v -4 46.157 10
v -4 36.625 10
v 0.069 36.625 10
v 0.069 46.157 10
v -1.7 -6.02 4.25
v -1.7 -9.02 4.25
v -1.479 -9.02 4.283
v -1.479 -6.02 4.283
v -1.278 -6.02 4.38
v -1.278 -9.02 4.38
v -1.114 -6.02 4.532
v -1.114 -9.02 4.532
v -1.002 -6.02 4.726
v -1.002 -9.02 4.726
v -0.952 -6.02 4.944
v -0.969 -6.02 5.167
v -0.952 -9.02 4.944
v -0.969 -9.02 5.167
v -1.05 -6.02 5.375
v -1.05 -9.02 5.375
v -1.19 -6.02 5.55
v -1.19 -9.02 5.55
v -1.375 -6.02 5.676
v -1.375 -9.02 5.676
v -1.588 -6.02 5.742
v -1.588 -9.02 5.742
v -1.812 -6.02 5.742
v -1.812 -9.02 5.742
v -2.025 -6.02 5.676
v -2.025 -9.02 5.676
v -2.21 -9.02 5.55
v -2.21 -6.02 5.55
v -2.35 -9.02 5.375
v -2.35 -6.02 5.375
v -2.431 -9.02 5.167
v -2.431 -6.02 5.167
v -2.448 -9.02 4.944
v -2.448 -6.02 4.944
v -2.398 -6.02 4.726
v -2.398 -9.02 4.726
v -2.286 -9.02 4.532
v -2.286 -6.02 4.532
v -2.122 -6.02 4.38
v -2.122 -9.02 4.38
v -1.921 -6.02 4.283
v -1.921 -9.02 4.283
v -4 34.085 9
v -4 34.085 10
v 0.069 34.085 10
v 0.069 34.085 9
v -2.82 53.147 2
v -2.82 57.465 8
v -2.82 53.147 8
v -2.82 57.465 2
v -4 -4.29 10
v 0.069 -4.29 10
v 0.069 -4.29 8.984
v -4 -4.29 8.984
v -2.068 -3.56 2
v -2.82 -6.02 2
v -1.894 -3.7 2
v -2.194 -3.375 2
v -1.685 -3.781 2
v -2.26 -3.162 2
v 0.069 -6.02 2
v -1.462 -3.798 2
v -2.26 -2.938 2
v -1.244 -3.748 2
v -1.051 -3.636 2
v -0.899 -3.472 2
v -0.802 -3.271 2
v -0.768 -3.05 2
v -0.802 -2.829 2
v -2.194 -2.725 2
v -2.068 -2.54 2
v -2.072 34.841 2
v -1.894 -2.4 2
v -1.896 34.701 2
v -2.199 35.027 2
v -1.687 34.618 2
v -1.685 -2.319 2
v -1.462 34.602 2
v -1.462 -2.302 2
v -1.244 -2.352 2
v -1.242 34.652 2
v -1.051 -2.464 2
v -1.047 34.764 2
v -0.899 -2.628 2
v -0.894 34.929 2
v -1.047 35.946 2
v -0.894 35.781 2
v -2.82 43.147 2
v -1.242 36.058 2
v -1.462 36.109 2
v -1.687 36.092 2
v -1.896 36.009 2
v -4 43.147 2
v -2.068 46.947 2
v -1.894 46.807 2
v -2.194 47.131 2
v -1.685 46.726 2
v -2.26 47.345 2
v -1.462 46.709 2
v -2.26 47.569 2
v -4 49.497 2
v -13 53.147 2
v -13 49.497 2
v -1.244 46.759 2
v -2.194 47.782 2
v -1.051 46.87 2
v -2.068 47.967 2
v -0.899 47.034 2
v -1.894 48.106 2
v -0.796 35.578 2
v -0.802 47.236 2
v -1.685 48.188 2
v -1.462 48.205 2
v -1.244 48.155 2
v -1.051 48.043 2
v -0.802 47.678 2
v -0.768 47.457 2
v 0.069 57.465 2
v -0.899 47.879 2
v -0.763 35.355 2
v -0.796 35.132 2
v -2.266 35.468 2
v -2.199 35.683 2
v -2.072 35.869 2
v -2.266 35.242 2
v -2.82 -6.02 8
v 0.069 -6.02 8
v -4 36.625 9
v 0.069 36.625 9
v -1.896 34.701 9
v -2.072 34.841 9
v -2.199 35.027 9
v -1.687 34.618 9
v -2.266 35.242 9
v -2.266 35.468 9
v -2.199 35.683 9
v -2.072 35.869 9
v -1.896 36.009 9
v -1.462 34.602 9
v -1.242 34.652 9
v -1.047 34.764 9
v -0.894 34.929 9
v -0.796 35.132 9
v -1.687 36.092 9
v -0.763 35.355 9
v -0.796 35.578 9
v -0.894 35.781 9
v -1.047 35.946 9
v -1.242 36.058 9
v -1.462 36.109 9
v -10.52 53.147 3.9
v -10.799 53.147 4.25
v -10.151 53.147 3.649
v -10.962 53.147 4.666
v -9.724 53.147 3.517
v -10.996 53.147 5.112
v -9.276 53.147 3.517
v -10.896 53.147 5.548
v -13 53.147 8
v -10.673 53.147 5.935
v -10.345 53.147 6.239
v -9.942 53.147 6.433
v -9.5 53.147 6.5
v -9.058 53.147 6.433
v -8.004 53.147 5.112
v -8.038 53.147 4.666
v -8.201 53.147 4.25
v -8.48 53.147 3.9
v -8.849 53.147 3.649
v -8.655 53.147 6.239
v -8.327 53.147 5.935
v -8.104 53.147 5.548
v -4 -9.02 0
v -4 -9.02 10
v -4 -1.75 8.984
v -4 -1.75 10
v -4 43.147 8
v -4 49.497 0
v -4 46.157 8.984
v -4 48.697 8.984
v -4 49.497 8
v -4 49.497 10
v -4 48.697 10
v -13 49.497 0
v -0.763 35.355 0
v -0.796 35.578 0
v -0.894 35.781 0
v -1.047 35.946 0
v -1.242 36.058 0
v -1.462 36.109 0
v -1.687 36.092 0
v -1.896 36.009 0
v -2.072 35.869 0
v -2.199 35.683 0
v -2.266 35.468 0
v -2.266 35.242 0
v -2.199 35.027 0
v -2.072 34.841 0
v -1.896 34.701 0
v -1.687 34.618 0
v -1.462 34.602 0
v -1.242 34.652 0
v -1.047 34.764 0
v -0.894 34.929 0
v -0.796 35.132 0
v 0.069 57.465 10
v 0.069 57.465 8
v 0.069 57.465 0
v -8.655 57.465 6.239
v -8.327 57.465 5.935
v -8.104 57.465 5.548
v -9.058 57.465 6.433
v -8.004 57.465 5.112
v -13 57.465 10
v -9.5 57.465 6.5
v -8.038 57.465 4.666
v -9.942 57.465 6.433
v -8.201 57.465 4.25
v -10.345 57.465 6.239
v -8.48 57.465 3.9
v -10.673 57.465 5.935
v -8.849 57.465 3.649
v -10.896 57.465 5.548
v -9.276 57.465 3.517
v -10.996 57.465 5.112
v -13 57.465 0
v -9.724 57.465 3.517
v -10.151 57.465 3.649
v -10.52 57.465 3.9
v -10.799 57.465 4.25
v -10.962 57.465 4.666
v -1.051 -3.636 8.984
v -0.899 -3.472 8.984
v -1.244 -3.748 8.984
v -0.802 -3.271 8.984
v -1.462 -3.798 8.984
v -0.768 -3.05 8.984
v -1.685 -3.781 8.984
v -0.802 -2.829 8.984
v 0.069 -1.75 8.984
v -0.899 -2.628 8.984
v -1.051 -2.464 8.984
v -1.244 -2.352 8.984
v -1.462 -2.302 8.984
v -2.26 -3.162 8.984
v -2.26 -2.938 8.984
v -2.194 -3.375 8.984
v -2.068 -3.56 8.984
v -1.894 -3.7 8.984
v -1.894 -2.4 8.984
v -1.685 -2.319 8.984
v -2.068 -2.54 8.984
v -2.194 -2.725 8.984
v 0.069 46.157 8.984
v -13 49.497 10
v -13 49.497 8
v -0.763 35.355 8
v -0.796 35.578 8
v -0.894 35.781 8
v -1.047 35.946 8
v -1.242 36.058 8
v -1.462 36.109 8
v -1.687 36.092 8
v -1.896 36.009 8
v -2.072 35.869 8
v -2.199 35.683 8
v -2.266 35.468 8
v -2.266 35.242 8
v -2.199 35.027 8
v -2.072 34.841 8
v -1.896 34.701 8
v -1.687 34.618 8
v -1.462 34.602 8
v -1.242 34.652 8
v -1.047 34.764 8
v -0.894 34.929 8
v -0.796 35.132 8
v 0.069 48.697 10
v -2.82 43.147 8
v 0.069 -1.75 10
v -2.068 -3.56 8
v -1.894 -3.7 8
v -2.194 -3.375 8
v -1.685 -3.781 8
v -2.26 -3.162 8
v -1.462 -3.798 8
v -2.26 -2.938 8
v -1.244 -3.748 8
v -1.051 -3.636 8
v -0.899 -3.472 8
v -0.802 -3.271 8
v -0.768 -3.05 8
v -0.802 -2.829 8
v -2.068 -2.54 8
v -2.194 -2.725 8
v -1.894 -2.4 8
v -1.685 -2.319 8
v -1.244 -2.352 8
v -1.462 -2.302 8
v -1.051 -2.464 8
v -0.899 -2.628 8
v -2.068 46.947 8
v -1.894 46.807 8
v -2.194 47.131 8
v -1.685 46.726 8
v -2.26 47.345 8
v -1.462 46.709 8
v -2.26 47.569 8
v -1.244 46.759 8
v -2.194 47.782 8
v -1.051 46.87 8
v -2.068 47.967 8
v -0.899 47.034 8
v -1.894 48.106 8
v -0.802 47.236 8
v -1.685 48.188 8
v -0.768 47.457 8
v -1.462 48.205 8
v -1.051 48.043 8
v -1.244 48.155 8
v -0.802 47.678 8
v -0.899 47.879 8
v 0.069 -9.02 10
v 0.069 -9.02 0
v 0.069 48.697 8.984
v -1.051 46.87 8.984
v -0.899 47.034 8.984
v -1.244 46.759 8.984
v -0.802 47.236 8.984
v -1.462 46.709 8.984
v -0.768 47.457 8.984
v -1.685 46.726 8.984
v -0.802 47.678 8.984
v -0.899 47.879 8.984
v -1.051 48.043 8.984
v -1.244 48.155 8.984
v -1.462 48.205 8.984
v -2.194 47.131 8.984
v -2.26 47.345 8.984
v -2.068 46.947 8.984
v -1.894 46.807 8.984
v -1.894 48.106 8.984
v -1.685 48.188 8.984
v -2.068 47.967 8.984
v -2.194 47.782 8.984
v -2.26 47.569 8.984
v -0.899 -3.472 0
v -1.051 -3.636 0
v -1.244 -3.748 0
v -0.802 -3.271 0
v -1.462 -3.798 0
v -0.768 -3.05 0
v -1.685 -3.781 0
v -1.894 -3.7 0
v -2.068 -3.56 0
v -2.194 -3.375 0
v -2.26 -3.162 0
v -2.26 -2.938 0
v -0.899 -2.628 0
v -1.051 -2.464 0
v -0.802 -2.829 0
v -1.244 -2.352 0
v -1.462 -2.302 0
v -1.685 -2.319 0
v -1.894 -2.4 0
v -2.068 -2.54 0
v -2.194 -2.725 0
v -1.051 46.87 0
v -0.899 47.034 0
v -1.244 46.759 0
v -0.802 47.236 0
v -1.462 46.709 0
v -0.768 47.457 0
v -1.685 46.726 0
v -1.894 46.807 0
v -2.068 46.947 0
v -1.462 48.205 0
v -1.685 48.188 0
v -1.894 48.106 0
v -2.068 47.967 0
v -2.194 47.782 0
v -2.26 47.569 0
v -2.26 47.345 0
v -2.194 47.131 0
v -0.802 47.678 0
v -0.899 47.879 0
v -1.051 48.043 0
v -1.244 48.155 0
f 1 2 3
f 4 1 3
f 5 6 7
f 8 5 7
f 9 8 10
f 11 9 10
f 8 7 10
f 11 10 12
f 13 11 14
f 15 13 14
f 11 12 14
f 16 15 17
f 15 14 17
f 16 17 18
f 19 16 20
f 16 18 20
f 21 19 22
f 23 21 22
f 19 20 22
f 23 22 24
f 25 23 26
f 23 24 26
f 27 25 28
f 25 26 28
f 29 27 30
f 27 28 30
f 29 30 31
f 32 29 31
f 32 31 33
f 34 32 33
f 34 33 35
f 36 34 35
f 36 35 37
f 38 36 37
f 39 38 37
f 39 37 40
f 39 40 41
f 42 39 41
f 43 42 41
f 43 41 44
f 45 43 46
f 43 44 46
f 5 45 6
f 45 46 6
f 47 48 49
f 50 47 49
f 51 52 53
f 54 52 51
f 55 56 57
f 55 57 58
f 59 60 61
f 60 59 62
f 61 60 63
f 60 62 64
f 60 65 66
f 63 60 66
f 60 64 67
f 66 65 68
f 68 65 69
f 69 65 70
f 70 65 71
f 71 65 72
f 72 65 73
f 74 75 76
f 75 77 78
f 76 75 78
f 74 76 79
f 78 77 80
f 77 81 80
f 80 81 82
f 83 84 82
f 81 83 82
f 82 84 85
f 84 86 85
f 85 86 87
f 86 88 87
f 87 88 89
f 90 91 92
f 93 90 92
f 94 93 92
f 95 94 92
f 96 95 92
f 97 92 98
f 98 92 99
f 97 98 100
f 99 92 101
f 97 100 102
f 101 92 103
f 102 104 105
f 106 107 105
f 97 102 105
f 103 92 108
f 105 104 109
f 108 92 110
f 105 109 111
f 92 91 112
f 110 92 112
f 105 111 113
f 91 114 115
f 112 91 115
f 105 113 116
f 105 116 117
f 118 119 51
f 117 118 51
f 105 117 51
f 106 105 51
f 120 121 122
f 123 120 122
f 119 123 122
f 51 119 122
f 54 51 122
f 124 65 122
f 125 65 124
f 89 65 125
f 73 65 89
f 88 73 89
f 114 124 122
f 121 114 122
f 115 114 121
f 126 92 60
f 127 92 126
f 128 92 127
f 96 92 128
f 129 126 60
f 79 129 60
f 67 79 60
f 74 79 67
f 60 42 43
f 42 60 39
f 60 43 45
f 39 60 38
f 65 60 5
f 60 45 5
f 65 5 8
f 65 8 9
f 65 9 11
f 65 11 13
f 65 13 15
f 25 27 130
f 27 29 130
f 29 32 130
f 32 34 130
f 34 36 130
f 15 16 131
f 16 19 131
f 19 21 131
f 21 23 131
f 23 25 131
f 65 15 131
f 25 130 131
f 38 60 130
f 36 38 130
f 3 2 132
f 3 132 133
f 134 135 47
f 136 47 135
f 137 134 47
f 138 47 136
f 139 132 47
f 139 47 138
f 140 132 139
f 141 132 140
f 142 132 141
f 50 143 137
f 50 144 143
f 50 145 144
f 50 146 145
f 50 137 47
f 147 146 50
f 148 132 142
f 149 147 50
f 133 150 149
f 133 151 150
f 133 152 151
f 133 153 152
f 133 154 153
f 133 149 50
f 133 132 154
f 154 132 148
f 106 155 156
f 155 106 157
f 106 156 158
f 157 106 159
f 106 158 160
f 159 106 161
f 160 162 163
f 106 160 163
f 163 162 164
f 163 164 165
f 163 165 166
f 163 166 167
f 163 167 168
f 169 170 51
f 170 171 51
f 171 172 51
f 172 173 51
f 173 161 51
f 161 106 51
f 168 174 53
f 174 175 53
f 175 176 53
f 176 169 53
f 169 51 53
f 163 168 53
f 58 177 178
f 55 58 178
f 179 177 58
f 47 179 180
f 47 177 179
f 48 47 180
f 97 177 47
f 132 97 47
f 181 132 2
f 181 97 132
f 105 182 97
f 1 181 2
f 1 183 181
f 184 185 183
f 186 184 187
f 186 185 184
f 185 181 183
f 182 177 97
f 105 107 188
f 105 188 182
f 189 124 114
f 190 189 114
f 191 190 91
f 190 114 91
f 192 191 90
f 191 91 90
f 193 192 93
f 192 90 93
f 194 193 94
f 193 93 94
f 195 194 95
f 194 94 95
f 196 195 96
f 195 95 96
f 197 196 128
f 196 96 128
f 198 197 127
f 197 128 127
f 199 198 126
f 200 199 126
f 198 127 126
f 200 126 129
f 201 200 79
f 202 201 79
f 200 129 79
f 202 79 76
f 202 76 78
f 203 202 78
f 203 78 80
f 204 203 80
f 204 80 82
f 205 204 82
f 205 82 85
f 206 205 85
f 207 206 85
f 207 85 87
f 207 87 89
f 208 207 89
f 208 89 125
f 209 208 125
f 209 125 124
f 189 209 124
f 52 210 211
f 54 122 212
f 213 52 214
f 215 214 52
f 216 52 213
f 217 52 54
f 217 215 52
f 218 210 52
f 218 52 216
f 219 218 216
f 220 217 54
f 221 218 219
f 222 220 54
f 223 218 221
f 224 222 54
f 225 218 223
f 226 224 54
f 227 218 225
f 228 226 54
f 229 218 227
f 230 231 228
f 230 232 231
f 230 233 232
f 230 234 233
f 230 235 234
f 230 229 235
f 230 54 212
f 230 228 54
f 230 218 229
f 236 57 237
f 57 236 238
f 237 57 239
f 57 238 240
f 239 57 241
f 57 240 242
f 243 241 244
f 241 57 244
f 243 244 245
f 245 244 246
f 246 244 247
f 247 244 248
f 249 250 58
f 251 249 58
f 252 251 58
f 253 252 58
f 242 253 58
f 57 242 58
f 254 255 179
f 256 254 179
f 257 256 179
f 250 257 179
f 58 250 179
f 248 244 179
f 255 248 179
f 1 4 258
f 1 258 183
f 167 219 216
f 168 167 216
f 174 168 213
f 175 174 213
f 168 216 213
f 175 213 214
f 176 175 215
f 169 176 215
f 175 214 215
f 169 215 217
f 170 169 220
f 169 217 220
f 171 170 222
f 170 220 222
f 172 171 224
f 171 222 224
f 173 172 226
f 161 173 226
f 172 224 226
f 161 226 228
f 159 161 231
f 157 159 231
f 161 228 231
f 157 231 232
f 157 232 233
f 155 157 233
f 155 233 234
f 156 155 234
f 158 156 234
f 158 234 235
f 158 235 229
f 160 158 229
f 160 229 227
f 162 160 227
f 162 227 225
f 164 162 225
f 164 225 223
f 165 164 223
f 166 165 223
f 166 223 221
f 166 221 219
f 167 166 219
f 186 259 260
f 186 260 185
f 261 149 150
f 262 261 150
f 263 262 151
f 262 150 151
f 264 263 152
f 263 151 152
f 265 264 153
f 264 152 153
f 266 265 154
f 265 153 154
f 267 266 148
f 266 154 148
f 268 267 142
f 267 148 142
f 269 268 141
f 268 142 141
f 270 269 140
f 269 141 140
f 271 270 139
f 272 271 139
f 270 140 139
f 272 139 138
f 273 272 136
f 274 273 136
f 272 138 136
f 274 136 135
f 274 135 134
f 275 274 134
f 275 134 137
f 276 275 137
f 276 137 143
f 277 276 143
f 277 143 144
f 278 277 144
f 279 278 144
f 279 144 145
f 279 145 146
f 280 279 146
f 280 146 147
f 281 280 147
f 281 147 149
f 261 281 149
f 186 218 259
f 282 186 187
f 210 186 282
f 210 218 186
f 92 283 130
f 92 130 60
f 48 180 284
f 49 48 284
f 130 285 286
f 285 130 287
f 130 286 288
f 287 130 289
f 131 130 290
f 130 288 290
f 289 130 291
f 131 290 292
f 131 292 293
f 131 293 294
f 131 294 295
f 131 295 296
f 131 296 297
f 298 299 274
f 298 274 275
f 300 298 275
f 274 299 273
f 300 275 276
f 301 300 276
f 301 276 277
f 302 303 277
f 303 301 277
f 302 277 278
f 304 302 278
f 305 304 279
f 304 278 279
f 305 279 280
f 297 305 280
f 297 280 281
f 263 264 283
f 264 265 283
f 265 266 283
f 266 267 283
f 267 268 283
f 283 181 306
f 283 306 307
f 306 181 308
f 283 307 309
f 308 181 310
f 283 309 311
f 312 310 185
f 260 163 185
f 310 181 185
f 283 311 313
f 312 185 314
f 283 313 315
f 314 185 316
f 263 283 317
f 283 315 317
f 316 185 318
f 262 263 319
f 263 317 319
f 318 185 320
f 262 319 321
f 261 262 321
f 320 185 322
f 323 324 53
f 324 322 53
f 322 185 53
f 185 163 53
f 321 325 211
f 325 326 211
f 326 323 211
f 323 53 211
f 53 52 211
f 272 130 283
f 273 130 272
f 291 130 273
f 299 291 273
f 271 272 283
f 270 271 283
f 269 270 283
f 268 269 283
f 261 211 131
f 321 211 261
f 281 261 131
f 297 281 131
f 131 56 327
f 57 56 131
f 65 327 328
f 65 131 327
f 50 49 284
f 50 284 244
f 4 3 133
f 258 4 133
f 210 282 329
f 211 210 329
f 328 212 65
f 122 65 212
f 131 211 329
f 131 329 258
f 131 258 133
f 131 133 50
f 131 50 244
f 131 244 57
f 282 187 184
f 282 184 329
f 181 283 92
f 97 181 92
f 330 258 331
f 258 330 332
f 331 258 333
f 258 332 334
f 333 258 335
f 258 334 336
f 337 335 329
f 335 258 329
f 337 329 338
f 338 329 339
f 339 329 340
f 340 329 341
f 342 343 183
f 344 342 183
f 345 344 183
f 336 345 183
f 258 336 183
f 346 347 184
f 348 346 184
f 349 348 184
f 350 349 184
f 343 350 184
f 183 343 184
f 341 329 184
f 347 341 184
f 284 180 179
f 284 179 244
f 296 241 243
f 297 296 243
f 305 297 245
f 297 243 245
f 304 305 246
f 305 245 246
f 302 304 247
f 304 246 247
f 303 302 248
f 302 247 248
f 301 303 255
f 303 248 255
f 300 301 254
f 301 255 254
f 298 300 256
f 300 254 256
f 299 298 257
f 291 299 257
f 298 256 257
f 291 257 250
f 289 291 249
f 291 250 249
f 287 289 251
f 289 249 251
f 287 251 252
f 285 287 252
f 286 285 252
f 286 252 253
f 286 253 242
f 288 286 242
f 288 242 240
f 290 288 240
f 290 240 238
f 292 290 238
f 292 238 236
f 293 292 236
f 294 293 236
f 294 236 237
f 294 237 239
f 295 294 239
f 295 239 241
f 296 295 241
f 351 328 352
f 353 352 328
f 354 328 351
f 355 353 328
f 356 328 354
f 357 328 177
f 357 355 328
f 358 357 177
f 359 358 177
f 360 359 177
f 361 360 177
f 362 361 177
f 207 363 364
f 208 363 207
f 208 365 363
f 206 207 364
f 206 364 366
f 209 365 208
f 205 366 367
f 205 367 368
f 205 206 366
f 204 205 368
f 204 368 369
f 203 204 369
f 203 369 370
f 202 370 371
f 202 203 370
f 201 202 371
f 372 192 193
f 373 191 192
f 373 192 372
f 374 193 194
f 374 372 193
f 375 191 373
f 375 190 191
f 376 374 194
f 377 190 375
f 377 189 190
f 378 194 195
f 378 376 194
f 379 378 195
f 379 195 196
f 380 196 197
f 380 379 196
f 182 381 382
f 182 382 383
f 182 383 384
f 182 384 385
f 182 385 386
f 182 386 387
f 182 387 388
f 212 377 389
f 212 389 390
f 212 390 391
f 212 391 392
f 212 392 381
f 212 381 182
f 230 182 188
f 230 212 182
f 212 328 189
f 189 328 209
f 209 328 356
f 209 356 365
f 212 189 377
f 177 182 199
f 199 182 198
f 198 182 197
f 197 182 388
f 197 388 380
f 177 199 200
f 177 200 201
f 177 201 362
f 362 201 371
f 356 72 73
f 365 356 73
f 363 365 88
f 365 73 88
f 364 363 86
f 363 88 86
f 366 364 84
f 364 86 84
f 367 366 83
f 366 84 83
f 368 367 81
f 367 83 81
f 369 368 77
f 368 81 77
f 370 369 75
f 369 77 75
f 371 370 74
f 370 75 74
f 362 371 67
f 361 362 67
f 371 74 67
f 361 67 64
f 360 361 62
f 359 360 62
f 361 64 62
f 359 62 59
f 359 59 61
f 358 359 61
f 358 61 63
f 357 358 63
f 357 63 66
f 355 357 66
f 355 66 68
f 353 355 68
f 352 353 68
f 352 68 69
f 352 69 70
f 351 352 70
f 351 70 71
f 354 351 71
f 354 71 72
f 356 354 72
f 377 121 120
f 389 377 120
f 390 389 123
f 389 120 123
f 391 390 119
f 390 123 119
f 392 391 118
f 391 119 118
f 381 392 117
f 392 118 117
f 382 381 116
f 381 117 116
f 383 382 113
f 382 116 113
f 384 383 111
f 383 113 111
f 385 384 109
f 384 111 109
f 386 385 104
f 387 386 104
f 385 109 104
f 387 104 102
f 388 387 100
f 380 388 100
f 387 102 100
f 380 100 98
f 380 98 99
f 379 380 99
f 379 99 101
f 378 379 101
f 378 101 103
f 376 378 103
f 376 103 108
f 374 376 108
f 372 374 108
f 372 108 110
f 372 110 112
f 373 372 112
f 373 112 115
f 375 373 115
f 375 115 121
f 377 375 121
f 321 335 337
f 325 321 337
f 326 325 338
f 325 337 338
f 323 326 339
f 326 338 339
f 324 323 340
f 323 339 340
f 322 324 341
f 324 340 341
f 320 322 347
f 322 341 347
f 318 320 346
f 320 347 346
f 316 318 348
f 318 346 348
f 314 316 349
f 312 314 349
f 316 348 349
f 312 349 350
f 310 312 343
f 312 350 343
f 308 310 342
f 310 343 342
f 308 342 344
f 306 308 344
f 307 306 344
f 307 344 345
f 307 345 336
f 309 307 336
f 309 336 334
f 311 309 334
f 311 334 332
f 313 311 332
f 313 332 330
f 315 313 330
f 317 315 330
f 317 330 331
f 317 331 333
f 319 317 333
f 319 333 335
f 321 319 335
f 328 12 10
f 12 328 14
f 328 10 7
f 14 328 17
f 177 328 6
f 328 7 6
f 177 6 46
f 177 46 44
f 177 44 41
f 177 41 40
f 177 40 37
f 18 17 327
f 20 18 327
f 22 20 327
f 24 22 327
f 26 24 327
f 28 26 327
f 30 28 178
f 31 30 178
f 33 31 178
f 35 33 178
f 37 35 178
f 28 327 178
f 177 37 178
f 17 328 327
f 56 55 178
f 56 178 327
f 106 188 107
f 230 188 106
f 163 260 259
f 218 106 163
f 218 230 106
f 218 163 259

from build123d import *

# Parameters (mm, degrees)
BOSS_EXTRUDE2_DEPTH = 10
SKETCH2_W           = 6
SKETCH2_H           = 21.5
CUT_EXTRUDE1_DEPTH  = 2
SKETCH18_W          = 10
SKETCH18_H          = 4
CUT_EXTRUDE6_DEPTH  = 2.32
BOSS_EXTRUDE4_DEPTH = 35.965
SKETCH20_W          = 10
SKETCH20_H          = 4.318
BOSS_EXTRUDE5_DEPTH = 9
SKETCH21_W          = 2
SKETCH21_H          = 57.465
BOSS_EXTRUDE6_DEPTH = 0.889
BOSS_EXTRUDE7_DEPTH = 9.02
CUT_EXTRUDE7_DEPTH  = 1.016
SKETCH24_W          = 4.069
SKETCH24_H          = 2.54
CUT_EXTRUDE8_DEPTH  = 1
SKETCH30_R          = 0.75565
CUT_EXTRUDE14_DEPTH = 95.738007626
SKETCH34_R          = 1.5
CUT_EXTRUDE18_DEPTH = 10
SKETCH35_R          = 0.75
CUT_EXTRUDE19_DEPTH = 60.59814159
SKETCH36_W          = 6
SKETCH36_H          = 10
CUT_EXTRUDE20_DEPTH = 10
SKETCH37_W          = 9
SKETCH37_H          = 2
BOSS_EXTRUDE8_DEPTH = 3.65
SKETCH38_W          = 4.069
SKETCH38_H          = 10
BOSS_EXTRUDE9_DEPTH = 3
SKETCH39_R          = 0.75
CUT_EXTRUDE21_DEPTH = 3


with BuildPart() as part:
    # Sketch1 → Boss-Extrude2 (new body)
    with BuildSketch(Plane.XY):
        Polygon((-4, 0), (-0.82, 0), (-0.82, 21.5), (-6.32, 21.5), (-6.32, 17.5), (-4, 17.5), align=None)
    extrude(amount=BOSS_EXTRUDE2_DEPTH)

    # Sketch2 → Cut-Extrude1 (cut)
    with BuildSketch(Plane(origin=(-0.82, 0, 0), x_dir=(0, 0, -1), z_dir=(1, 0, 0))):
        with Locations((-5, 10.75)):
            Rectangle(SKETCH2_W, SKETCH2_H)
    extrude(amount=-CUT_EXTRUDE1_DEPTH, mode=Mode.SUBTRACT)

    # Sketch18 → Cut-Extrude6 (cut)
    with BuildSketch(Plane.ZY.offset(6.32)):
        with Locations((5, 19.5)):
            Rectangle(SKETCH18_W, SKETCH18_H)
    extrude(amount=-CUT_EXTRUDE6_DEPTH, mode=Mode.SUBTRACT)

    # Sketch19 → Boss-Extrude4 (add)
    with BuildSketch(Plane(origin=(0, 21.5, 0), x_dir=(1, 0, 0), z_dir=(0, 1, 0))):
        Polygon((-0.82, -10), (-4, -10), (-4, 0), (-0.82, 0), (-0.82, -2), (-2.82, -2), (-2.82, -8), (-0.82, -8), align=None)
    extrude(amount=BOSS_EXTRUDE4_DEPTH)

    # Sketch20 → Boss-Extrude5 (add)
    with BuildSketch(Plane.ZY.offset(4)):
        with Locations((5, 55.306)):
            Rectangle(SKETCH20_W, SKETCH20_H)
    extrude(amount=BOSS_EXTRUDE5_DEPTH)

    # Sketch21 → Boss-Extrude6 (add)
    with BuildSketch(Plane(origin=(-0.82, 0, 0), x_dir=(0, 0, -1), z_dir=(1, 0, 0))):
        with Locations((-9, 28.7325)):
            Rectangle(SKETCH21_W, SKETCH21_H)
        with Locations((-1, 28.7325)):
            Rectangle(SKETCH21_W, SKETCH21_H)
    extrude(amount=BOSS_EXTRUDE6_DEPTH)

    # Sketch22 → Boss-Extrude7 (add)
    with BuildSketch(Plane.XZ):
        Polygon((-4, 10), (0.069, 10), (0.069, 8), (-2.82, 8), (-2.82, 2), (0.069, 2), (0.069, 0), (-4, 0), align=None)
    extrude(amount=BOSS_EXTRUDE7_DEPTH)

    # Sketch23 → Cut-Extrude7 (cut)
    with BuildSketch(Plane.XY.offset(10)):
        Polygon((0.069, -3.02), (0.069, -4.29), (-4, -4.29), (-4, -1.75), (0.069, -1.75), align=None)
        Polygon((-4, 47.426731456), (-4, 48.696731456), (0.069, 48.696731456), (0.069, 46.156731456), (-4, 46.156731456), align=None)
    extrude(amount=-CUT_EXTRUDE7_DEPTH, mode=Mode.SUBTRACT)

    # Sketch24 → Cut-Extrude8 (cut)
    with BuildSketch(Plane.XY.offset(10)):
        with Locations((-1.9655, 35.355048592)):
            Rectangle(SKETCH24_W, SKETCH24_H)
    extrude(amount=-CUT_EXTRUDE8_DEPTH, mode=Mode.SUBTRACT)

    # Sketch30 → Cut-Extrude14 (cut, through all)
    with BuildSketch(Plane(origin=(35.063086629, -23.678267082, 9), x_dir=(1, 0, 0), z_dir=(0, 0, 1))):
        with Locations((-36.581586629, 59.033315674)):
            Circle(SKETCH30_R)
    extrude(amount=-CUT_EXTRUDE14_DEPTH, mode=Mode.SUBTRACT)

    # Sketch34 → Cut-Extrude18 (cut)
    with BuildSketch(Plane(origin=(0, 57.465, 0), x_dir=(1, 0, 0), z_dir=(0, 1, 0))):
        with Locations(Location((-9.5, -5, 0), (0, 0, 270))):
            Circle(SKETCH34_R)
    extrude(amount=-CUT_EXTRUDE18_DEPTH, mode=Mode.SUBTRACT)

    # Sketch35 → Cut-Extrude19 (cut, through all)
    with BuildSketch(Plane.XY.offset(8.984)):
        with Locations((-1.5185, 47.456731456)):
            Circle(SKETCH35_R)
        with Locations((-1.5185, -3.05)):
            Circle(SKETCH35_R)
    extrude(amount=-CUT_EXTRUDE19_DEPTH, mode=Mode.SUBTRACT)

    # Sketch36 → Cut-Extrude20 (cut)
    with BuildSketch(Plane(origin=(-2.82, 0, 0), x_dir=(0, 0, -1), z_dir=(1, 0, 0))):
        with Locations((-5, 48.147)):
            Rectangle(SKETCH36_W, SKETCH36_H)
    extrude(amount=-CUT_EXTRUDE20_DEPTH, mode=Mode.SUBTRACT)

    # Sketch37 → Boss-Extrude8 (add)
    with BuildSketch(Plane.XZ.offset(-53.147)):
        with Locations((-8.5, 9)):
            Rectangle(SKETCH37_W, SKETCH37_H)
        with Locations((-8.5, 1)):
            Rectangle(SKETCH37_W, SKETCH37_H)
    extrude(amount=BOSS_EXTRUDE8_DEPTH)

    # Sketch38 → Boss-Extrude9 (add)
    with BuildSketch(Plane.XZ.offset(9.02)):
        with Locations((-1.9655, 5)):
            Rectangle(SKETCH38_W, SKETCH38_H)
    extrude(amount=-BOSS_EXTRUDE9_DEPTH)

    # Sketch39 → Cut-Extrude21 (cut)
    with BuildSketch(Plane.XZ.offset(9.02)):
        with Locations(Location((-1.7, 5, 0), (0, 0, 270))):
            Circle(SKETCH39_R)
    extrude(amount=-CUT_EXTRUDE21_DEPTH, mode=Mode.SUBTRACT)


solid = part.part
